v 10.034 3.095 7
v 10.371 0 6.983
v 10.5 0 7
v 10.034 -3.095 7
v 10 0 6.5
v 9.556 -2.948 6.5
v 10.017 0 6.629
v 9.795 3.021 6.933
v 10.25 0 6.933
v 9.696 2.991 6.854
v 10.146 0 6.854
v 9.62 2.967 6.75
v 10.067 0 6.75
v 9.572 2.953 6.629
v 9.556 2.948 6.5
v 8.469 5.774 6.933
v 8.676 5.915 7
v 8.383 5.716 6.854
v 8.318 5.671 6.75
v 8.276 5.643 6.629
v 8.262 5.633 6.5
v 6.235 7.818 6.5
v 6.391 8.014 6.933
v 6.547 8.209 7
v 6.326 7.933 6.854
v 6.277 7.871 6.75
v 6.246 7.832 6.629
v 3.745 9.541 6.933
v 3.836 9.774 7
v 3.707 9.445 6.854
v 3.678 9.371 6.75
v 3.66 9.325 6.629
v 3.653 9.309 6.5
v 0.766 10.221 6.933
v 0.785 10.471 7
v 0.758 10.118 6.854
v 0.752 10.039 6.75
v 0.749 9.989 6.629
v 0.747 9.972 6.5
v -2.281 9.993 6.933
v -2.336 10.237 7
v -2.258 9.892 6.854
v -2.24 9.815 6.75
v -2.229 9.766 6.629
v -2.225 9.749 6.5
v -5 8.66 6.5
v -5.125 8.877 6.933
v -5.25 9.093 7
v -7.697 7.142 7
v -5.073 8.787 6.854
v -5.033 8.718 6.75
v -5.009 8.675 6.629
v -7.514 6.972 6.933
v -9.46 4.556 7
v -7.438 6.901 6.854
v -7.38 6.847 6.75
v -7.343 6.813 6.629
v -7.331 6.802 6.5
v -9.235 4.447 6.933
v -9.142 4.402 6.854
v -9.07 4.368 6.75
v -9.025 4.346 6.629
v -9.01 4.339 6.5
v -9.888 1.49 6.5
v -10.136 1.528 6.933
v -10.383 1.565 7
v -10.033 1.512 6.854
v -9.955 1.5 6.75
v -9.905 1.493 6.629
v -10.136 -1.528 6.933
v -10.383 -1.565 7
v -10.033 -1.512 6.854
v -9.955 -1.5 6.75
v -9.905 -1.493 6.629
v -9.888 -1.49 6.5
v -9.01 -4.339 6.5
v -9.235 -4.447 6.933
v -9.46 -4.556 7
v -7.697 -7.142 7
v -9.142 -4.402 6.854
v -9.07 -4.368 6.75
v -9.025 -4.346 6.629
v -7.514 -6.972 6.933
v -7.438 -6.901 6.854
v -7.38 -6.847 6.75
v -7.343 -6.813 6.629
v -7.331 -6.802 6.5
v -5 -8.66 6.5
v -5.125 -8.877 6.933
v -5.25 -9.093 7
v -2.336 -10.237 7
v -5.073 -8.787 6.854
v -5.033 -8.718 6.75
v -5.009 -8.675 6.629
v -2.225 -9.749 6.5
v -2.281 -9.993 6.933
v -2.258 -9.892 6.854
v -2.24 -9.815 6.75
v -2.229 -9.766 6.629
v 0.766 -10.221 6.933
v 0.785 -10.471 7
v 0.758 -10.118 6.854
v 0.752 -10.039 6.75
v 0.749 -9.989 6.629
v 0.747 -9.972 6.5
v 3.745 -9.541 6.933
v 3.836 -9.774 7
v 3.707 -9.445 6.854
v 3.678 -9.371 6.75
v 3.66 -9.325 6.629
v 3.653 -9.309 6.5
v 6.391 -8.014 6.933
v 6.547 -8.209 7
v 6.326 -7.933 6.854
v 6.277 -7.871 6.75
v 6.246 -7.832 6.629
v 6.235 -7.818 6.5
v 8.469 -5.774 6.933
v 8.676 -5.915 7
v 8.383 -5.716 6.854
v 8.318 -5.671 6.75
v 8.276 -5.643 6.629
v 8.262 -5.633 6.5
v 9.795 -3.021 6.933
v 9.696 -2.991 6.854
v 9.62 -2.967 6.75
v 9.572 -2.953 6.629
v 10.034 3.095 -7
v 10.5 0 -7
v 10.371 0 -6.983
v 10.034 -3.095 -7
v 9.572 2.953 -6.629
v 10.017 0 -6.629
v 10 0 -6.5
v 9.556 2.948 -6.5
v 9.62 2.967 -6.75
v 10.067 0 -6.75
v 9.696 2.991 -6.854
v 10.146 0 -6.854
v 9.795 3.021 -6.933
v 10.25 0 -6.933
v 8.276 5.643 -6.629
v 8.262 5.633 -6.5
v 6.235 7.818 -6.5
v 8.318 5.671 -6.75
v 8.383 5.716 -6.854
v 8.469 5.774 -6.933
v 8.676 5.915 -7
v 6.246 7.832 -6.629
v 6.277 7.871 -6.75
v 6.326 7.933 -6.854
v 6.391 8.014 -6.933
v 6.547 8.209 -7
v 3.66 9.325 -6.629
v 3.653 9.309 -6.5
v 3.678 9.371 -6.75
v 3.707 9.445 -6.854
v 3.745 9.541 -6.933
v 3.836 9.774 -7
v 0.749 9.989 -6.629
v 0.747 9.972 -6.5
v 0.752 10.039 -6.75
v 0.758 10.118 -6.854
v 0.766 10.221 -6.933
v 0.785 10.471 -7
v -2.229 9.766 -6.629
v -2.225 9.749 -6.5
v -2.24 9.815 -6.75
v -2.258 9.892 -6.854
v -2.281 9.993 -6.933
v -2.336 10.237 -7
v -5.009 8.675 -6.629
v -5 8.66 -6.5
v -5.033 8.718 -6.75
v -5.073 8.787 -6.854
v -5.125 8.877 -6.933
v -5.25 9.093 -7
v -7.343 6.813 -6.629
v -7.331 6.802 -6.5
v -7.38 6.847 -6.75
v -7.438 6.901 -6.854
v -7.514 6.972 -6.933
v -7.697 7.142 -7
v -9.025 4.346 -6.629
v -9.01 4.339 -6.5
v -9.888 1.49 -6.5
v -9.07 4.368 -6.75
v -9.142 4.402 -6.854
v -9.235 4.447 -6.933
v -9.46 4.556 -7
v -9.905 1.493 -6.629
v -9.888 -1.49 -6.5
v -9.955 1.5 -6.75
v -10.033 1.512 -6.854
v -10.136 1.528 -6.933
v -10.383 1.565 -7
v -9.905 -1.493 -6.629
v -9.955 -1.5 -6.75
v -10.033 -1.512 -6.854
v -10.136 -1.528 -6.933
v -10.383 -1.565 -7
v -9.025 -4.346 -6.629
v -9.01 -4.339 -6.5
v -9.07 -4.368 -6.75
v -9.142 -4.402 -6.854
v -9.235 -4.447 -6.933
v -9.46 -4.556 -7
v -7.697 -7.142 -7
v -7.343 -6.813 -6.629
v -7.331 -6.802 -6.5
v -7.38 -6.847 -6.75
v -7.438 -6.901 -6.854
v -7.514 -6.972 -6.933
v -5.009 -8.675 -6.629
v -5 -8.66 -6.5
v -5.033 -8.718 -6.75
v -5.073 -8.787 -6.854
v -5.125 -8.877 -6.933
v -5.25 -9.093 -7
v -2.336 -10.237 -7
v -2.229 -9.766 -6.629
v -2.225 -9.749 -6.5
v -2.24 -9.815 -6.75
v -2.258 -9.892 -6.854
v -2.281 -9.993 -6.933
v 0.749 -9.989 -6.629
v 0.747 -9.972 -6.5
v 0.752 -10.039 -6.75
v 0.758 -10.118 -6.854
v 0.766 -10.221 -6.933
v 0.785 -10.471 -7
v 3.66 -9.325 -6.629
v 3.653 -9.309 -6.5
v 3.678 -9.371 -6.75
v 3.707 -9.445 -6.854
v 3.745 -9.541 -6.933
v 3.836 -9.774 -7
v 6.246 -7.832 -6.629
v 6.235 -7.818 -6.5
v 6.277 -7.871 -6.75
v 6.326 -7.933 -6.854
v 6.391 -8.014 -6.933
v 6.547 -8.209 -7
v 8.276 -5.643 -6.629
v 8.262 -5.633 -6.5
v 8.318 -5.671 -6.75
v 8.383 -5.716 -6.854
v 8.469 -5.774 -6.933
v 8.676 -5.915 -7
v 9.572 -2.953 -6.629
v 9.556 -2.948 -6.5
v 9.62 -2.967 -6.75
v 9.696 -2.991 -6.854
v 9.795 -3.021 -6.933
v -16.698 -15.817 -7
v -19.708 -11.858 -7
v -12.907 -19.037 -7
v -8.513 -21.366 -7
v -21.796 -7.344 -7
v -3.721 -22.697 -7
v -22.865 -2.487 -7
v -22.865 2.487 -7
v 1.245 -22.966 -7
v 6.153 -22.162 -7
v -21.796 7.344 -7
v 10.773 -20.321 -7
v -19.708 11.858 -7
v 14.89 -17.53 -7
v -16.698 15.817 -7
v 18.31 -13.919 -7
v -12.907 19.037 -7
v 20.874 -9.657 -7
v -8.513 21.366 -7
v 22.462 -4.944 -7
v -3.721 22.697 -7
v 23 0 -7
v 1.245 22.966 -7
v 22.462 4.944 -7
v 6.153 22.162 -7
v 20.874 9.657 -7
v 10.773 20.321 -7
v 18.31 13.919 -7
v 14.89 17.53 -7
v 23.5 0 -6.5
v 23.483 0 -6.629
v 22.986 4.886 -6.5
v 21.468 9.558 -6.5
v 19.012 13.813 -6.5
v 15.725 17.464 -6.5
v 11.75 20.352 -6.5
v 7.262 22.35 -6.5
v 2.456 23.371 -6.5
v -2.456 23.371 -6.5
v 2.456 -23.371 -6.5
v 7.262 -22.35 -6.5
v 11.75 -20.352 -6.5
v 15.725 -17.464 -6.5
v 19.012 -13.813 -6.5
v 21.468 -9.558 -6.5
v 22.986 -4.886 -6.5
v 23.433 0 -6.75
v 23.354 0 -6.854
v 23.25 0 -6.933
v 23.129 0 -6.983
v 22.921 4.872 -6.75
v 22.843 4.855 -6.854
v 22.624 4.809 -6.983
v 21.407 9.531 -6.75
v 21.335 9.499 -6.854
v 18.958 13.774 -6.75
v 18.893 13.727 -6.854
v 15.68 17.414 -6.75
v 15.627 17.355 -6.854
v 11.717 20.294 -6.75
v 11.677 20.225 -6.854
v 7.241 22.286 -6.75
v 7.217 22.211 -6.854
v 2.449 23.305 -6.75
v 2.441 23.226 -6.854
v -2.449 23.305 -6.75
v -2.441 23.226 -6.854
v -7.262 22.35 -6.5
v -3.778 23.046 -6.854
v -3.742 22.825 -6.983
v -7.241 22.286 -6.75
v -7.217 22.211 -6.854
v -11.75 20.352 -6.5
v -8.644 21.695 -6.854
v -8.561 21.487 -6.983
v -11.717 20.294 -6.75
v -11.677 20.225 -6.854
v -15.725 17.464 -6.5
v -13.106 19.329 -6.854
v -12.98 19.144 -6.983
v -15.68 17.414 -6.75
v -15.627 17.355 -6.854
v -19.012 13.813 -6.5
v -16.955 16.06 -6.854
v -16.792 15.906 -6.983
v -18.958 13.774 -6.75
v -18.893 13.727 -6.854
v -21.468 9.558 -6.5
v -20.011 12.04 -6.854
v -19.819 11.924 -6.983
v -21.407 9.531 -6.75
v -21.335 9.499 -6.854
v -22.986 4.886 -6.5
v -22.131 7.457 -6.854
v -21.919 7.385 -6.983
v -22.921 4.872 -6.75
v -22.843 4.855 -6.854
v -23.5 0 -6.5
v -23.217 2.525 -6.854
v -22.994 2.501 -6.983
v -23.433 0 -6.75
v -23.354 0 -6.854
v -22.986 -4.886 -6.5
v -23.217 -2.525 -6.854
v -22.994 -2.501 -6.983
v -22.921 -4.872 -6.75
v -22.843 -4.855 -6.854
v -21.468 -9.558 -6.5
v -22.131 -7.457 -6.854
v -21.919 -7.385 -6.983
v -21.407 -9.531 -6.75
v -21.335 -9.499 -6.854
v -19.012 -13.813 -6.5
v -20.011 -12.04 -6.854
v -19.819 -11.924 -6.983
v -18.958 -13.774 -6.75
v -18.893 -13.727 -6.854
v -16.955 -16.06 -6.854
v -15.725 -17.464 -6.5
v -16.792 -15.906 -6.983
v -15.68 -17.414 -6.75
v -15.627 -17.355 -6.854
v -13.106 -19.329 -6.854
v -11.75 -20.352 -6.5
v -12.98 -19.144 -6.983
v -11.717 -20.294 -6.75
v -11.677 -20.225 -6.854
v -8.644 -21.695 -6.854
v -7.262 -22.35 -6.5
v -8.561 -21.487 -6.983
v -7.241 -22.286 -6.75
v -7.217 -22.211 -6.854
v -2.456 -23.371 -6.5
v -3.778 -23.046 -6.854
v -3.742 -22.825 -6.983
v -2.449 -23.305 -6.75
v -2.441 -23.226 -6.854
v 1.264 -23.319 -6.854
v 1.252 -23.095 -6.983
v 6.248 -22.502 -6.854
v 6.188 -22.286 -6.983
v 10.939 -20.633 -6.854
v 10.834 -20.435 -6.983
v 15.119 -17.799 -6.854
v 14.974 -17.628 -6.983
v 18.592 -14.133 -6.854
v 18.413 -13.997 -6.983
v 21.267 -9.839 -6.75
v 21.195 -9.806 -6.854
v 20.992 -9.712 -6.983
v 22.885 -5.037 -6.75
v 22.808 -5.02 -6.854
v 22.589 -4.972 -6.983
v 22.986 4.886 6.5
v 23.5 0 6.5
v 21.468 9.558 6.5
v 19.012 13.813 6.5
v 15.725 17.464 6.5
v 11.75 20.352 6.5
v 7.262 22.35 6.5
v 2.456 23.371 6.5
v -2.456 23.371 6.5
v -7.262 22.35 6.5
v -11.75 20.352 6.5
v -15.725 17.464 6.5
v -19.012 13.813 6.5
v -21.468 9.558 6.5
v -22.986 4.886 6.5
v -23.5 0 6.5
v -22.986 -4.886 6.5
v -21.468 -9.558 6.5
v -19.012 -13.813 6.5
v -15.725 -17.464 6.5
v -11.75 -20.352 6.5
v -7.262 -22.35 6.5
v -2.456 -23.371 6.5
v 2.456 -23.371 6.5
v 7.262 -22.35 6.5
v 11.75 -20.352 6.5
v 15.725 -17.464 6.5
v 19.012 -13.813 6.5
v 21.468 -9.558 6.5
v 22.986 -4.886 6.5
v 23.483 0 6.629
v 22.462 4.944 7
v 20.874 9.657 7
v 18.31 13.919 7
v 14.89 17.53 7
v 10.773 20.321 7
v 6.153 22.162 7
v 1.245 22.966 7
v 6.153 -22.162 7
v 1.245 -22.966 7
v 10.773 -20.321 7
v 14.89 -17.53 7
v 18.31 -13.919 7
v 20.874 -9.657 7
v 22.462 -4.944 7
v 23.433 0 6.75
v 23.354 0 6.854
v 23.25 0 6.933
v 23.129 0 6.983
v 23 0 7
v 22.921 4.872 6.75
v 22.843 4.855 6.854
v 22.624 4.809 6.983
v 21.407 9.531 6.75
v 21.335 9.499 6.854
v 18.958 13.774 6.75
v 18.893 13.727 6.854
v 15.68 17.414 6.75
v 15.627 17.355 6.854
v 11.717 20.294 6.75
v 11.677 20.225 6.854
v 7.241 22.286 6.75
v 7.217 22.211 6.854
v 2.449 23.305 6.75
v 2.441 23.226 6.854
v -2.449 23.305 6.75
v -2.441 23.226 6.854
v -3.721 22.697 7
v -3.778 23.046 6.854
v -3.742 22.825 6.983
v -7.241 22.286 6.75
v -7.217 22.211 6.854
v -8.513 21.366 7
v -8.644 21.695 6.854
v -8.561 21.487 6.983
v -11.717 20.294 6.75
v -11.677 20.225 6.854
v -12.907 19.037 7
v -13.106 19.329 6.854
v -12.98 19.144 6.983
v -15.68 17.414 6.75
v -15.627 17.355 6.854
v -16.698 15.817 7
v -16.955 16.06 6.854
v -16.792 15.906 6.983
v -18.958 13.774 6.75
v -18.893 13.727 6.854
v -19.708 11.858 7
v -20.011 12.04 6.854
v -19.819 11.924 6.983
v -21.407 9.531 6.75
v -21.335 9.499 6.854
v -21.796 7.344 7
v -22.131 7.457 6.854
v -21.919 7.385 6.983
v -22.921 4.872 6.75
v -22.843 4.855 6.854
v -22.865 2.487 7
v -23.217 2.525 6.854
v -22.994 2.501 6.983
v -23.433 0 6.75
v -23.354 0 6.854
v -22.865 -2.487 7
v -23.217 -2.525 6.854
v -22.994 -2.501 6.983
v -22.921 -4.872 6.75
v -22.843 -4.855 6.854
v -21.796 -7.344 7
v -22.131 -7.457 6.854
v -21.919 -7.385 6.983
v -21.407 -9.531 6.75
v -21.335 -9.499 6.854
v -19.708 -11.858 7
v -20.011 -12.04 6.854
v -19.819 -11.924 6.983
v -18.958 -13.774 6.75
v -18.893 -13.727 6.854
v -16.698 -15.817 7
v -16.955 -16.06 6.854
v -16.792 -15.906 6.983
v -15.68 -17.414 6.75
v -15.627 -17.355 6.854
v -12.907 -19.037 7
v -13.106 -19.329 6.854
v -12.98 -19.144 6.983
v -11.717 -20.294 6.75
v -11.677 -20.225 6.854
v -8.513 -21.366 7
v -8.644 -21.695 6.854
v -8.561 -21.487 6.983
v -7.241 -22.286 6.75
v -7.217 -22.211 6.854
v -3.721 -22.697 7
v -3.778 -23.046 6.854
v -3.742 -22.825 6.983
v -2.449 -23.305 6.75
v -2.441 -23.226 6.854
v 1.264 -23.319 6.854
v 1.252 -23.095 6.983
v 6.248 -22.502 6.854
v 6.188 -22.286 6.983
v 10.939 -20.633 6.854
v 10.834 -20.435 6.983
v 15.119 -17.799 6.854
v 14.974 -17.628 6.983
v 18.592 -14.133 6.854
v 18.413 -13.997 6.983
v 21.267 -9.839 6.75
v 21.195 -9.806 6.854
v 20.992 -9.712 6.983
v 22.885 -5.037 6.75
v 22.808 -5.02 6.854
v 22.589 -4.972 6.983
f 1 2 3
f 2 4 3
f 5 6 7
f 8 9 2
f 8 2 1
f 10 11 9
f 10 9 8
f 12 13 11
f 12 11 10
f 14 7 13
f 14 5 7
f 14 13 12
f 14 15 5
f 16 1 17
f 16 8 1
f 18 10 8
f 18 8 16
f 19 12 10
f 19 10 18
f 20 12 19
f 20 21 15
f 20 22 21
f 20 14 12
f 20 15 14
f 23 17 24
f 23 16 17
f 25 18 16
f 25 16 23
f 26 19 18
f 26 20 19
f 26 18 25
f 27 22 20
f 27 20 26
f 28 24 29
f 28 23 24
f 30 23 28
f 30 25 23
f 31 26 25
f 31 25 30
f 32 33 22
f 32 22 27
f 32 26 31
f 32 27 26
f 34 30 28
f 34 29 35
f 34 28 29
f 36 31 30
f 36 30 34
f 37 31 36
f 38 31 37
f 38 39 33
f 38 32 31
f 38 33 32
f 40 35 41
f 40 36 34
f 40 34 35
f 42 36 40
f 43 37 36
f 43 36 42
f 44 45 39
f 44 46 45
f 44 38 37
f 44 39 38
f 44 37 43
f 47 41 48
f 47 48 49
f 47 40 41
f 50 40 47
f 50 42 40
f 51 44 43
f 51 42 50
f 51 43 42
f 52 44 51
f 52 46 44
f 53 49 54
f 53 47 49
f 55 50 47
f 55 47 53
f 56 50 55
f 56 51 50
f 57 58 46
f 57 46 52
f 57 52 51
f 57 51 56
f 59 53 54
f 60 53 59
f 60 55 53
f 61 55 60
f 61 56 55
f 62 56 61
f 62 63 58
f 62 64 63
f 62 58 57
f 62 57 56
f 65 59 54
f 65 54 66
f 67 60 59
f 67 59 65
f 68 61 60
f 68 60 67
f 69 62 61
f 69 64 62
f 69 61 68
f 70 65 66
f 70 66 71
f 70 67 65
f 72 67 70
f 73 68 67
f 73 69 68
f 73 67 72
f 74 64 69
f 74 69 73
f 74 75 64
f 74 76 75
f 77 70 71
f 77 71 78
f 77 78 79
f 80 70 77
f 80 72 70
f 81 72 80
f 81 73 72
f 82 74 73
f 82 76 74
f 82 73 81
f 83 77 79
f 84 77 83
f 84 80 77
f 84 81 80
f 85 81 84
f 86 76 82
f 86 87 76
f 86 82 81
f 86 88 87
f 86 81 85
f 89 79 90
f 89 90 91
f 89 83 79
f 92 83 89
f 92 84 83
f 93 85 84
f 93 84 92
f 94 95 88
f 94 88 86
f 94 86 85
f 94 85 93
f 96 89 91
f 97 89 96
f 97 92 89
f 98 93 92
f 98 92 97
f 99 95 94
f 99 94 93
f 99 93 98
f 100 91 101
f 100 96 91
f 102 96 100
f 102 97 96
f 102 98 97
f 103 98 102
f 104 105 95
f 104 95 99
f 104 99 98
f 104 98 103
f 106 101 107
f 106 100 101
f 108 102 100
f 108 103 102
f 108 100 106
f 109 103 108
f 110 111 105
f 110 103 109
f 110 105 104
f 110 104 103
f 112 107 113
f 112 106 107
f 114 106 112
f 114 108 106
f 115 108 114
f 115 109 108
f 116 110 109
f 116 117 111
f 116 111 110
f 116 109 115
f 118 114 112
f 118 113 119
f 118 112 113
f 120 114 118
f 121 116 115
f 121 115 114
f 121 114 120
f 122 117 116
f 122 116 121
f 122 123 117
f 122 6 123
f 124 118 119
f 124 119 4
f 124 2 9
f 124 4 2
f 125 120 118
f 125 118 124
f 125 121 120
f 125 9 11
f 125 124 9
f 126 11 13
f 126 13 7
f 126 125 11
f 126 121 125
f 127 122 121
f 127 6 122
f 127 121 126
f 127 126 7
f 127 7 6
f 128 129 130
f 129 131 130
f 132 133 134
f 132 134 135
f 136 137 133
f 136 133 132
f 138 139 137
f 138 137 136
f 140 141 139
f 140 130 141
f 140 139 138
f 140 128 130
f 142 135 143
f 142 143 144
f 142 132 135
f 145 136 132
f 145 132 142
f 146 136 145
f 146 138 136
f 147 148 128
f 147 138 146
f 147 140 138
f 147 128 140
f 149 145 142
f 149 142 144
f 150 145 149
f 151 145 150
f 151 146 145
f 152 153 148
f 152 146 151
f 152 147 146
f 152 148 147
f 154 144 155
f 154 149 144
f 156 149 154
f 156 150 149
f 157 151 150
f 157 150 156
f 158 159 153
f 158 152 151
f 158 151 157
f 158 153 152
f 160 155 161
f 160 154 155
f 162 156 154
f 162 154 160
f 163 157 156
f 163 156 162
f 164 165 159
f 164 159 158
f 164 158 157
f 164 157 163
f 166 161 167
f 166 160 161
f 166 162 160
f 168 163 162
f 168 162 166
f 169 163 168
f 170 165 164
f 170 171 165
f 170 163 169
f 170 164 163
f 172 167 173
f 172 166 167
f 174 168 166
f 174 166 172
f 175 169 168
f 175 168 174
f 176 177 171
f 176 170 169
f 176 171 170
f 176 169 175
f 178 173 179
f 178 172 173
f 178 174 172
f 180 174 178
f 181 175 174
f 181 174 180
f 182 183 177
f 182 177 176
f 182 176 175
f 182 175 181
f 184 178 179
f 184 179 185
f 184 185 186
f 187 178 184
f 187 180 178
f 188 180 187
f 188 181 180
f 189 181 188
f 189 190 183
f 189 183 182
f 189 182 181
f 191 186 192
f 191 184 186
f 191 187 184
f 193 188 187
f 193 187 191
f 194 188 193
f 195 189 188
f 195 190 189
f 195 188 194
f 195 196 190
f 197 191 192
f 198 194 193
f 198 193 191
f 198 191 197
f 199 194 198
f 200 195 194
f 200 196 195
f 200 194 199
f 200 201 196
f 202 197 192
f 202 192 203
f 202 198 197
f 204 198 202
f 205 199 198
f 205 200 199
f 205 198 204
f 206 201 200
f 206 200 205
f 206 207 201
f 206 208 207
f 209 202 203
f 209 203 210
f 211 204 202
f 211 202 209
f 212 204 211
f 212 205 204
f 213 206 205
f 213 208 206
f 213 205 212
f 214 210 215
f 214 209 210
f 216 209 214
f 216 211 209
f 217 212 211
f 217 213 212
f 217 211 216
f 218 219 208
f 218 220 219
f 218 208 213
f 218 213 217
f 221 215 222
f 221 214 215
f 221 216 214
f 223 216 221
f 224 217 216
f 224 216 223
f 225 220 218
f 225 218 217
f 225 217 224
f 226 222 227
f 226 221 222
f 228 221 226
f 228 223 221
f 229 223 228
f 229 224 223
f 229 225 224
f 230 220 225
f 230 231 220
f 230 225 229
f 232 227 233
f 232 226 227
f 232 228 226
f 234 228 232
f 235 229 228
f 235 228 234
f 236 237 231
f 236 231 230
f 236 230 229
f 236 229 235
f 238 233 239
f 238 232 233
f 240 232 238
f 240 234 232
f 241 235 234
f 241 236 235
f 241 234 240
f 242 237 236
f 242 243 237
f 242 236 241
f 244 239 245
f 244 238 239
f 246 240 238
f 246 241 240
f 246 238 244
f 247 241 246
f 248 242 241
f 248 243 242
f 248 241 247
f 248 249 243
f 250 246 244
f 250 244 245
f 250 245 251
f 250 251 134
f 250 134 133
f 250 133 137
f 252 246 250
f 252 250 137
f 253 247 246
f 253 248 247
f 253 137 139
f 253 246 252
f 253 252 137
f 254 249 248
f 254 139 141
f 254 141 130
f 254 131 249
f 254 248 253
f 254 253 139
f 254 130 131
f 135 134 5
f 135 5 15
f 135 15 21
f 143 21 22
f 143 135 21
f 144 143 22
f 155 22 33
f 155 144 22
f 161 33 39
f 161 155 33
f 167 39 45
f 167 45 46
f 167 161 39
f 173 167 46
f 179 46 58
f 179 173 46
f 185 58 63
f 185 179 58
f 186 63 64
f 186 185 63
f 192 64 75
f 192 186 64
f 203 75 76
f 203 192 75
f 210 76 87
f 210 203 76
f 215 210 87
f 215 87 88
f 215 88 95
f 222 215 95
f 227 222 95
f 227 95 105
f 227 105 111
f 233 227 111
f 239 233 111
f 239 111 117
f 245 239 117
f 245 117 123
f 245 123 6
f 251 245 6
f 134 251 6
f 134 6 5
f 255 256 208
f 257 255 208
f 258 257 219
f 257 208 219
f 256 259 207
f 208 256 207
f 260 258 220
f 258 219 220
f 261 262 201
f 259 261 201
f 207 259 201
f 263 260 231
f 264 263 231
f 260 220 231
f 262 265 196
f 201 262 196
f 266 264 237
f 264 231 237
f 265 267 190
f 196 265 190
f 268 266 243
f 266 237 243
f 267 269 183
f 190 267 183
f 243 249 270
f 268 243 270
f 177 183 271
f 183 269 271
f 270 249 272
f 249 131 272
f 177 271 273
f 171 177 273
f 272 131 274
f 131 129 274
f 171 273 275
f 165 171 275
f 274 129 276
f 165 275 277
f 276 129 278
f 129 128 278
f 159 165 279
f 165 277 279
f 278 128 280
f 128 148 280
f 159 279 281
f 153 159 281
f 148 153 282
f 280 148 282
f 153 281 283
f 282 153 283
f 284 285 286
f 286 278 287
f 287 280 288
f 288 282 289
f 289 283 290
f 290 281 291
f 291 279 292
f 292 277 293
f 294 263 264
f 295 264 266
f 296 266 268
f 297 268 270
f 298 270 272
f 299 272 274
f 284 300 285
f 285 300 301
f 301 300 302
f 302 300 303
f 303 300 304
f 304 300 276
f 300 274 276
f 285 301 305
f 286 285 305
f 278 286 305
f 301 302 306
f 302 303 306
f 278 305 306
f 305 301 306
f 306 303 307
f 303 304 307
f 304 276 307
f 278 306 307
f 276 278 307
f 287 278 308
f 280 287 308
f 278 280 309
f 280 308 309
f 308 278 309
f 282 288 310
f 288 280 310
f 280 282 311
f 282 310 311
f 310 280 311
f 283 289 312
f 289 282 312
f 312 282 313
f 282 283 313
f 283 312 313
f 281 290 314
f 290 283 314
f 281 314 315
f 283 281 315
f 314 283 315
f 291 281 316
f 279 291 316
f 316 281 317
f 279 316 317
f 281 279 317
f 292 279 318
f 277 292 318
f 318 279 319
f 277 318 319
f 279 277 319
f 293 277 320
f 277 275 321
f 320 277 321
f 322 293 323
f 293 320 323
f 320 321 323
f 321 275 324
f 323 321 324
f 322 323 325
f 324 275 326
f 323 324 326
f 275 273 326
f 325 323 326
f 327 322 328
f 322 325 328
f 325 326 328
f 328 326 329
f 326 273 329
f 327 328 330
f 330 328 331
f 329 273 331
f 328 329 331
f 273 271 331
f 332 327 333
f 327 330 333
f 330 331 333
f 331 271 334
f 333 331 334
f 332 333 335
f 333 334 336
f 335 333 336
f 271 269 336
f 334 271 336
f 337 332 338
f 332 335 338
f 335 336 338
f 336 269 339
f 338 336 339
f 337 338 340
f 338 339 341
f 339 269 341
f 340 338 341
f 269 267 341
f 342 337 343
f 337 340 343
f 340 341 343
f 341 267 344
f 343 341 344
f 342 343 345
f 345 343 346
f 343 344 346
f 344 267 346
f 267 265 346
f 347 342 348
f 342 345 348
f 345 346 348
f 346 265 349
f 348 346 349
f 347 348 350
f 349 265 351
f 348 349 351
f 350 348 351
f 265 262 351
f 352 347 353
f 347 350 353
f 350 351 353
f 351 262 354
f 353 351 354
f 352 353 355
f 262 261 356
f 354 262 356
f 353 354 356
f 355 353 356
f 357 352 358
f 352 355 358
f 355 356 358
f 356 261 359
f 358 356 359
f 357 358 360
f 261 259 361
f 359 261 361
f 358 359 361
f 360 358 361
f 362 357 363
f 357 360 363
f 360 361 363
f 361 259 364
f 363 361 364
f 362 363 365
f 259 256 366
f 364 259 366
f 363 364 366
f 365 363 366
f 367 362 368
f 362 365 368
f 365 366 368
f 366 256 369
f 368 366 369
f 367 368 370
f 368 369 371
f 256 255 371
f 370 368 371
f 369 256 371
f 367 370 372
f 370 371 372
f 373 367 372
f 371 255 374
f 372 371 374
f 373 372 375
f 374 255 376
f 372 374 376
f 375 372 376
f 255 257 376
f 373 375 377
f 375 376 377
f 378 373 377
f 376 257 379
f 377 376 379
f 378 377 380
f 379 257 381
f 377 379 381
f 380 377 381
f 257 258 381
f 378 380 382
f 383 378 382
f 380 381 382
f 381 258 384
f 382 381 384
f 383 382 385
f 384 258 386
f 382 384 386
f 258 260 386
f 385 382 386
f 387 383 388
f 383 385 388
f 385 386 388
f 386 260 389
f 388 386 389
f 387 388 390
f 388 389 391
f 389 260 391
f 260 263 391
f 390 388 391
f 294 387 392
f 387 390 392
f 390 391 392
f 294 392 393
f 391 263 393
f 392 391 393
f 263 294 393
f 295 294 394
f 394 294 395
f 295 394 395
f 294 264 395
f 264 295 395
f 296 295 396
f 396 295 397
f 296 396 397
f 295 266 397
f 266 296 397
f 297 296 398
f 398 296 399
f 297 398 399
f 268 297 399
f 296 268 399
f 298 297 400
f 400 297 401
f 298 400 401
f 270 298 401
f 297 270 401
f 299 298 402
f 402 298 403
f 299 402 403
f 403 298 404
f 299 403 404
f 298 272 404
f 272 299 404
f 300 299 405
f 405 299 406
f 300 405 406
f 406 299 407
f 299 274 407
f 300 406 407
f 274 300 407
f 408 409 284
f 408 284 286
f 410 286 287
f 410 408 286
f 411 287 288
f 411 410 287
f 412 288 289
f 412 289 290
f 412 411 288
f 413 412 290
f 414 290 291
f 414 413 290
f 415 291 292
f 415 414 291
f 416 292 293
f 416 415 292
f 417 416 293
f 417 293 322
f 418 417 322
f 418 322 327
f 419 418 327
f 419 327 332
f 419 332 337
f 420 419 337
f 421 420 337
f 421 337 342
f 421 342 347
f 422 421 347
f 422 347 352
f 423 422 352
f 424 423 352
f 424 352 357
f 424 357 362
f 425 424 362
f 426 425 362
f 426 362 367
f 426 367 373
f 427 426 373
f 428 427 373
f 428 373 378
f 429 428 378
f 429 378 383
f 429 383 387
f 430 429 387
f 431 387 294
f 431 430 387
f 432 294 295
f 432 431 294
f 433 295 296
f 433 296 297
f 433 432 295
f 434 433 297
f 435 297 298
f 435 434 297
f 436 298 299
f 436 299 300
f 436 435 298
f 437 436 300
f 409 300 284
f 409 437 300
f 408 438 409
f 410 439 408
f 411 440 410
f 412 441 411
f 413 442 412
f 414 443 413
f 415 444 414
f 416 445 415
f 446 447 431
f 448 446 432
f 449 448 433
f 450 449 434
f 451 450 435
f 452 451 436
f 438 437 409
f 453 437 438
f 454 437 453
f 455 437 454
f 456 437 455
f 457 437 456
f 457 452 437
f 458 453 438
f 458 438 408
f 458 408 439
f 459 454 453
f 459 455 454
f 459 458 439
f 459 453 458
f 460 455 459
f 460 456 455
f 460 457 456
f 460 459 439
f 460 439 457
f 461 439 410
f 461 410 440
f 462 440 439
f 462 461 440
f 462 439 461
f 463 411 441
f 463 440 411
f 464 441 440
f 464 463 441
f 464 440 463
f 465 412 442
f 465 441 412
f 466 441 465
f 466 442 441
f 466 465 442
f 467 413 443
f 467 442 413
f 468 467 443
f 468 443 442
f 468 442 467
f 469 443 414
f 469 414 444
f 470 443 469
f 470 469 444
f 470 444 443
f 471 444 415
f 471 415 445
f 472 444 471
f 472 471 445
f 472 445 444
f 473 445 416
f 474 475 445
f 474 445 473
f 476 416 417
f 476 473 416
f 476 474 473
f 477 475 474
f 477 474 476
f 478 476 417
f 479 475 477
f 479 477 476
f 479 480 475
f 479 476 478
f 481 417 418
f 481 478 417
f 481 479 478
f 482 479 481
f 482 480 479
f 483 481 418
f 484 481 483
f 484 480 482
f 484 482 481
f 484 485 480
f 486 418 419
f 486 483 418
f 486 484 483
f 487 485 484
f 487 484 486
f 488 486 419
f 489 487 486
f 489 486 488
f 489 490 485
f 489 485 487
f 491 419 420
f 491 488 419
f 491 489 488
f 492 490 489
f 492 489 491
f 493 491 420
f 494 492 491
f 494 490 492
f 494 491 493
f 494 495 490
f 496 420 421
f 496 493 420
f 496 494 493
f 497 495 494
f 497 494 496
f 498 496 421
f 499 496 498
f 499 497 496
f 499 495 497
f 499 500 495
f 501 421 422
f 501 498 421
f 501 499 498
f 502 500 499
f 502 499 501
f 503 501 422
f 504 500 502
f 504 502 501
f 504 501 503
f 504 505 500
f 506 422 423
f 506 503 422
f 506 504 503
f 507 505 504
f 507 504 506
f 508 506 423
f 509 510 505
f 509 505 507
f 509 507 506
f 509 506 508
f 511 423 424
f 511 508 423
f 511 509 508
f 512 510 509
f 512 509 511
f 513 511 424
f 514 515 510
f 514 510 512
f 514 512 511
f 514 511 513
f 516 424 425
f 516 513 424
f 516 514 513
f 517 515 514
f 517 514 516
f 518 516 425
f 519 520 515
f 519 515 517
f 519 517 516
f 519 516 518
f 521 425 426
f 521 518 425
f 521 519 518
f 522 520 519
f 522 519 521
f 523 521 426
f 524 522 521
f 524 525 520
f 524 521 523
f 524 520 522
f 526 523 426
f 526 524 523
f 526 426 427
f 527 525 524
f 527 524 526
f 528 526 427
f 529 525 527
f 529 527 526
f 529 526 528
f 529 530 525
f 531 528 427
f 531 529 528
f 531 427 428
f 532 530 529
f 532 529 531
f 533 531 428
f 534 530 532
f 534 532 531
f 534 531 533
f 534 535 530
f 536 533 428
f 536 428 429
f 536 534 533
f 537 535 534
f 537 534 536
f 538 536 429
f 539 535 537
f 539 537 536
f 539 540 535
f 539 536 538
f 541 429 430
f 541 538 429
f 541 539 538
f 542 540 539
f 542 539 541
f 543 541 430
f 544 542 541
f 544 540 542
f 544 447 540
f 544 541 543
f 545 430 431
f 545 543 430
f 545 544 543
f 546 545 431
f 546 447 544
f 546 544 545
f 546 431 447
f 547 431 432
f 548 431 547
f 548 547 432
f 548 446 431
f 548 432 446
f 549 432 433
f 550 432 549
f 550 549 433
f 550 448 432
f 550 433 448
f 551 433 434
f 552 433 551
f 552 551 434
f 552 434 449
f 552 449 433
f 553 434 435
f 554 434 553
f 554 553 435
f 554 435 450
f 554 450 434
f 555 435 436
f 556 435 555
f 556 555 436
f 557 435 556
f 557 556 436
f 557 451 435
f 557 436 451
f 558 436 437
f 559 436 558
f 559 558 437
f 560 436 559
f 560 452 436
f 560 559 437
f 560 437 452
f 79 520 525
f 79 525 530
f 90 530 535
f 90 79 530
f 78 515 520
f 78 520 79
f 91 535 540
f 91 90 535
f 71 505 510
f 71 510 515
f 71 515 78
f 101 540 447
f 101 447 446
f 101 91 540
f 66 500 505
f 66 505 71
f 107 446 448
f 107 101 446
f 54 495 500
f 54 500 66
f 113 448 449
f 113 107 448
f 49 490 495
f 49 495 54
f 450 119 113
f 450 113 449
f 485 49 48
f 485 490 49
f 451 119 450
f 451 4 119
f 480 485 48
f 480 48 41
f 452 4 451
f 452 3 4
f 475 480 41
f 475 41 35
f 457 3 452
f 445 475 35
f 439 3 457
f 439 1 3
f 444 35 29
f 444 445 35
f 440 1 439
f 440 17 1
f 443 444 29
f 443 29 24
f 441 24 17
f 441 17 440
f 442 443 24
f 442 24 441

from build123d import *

# Parameters (mm, degrees)
F0_R     = 23.5
F0_R_2   = 10
F1_DEPTH = 7
F2_R     = 0.5


with BuildPart() as f1:
    # F0 (on Top) → F1 (new body, symmetric)
    with BuildSketch(Plane.XY):
        Circle(F0_R)
        Circle(F0_R_2, mode=Mode.SUBTRACT)
    extrude(amount=F1_DEPTH, both=True)

    # F2
    f2_edges = [f1.edges().sort_by_distance(p)[0] for p in [
        (-23.5, 0, -7),
        (23.5, 0, 0),
        (-23.5, 0, 7),
        (-10, 0, 7),
        (10, 0, 0),
        (-10, 0, -7),
    ]]
    fillet(f2_edges, radius=F2_R)


solid = f1.part
